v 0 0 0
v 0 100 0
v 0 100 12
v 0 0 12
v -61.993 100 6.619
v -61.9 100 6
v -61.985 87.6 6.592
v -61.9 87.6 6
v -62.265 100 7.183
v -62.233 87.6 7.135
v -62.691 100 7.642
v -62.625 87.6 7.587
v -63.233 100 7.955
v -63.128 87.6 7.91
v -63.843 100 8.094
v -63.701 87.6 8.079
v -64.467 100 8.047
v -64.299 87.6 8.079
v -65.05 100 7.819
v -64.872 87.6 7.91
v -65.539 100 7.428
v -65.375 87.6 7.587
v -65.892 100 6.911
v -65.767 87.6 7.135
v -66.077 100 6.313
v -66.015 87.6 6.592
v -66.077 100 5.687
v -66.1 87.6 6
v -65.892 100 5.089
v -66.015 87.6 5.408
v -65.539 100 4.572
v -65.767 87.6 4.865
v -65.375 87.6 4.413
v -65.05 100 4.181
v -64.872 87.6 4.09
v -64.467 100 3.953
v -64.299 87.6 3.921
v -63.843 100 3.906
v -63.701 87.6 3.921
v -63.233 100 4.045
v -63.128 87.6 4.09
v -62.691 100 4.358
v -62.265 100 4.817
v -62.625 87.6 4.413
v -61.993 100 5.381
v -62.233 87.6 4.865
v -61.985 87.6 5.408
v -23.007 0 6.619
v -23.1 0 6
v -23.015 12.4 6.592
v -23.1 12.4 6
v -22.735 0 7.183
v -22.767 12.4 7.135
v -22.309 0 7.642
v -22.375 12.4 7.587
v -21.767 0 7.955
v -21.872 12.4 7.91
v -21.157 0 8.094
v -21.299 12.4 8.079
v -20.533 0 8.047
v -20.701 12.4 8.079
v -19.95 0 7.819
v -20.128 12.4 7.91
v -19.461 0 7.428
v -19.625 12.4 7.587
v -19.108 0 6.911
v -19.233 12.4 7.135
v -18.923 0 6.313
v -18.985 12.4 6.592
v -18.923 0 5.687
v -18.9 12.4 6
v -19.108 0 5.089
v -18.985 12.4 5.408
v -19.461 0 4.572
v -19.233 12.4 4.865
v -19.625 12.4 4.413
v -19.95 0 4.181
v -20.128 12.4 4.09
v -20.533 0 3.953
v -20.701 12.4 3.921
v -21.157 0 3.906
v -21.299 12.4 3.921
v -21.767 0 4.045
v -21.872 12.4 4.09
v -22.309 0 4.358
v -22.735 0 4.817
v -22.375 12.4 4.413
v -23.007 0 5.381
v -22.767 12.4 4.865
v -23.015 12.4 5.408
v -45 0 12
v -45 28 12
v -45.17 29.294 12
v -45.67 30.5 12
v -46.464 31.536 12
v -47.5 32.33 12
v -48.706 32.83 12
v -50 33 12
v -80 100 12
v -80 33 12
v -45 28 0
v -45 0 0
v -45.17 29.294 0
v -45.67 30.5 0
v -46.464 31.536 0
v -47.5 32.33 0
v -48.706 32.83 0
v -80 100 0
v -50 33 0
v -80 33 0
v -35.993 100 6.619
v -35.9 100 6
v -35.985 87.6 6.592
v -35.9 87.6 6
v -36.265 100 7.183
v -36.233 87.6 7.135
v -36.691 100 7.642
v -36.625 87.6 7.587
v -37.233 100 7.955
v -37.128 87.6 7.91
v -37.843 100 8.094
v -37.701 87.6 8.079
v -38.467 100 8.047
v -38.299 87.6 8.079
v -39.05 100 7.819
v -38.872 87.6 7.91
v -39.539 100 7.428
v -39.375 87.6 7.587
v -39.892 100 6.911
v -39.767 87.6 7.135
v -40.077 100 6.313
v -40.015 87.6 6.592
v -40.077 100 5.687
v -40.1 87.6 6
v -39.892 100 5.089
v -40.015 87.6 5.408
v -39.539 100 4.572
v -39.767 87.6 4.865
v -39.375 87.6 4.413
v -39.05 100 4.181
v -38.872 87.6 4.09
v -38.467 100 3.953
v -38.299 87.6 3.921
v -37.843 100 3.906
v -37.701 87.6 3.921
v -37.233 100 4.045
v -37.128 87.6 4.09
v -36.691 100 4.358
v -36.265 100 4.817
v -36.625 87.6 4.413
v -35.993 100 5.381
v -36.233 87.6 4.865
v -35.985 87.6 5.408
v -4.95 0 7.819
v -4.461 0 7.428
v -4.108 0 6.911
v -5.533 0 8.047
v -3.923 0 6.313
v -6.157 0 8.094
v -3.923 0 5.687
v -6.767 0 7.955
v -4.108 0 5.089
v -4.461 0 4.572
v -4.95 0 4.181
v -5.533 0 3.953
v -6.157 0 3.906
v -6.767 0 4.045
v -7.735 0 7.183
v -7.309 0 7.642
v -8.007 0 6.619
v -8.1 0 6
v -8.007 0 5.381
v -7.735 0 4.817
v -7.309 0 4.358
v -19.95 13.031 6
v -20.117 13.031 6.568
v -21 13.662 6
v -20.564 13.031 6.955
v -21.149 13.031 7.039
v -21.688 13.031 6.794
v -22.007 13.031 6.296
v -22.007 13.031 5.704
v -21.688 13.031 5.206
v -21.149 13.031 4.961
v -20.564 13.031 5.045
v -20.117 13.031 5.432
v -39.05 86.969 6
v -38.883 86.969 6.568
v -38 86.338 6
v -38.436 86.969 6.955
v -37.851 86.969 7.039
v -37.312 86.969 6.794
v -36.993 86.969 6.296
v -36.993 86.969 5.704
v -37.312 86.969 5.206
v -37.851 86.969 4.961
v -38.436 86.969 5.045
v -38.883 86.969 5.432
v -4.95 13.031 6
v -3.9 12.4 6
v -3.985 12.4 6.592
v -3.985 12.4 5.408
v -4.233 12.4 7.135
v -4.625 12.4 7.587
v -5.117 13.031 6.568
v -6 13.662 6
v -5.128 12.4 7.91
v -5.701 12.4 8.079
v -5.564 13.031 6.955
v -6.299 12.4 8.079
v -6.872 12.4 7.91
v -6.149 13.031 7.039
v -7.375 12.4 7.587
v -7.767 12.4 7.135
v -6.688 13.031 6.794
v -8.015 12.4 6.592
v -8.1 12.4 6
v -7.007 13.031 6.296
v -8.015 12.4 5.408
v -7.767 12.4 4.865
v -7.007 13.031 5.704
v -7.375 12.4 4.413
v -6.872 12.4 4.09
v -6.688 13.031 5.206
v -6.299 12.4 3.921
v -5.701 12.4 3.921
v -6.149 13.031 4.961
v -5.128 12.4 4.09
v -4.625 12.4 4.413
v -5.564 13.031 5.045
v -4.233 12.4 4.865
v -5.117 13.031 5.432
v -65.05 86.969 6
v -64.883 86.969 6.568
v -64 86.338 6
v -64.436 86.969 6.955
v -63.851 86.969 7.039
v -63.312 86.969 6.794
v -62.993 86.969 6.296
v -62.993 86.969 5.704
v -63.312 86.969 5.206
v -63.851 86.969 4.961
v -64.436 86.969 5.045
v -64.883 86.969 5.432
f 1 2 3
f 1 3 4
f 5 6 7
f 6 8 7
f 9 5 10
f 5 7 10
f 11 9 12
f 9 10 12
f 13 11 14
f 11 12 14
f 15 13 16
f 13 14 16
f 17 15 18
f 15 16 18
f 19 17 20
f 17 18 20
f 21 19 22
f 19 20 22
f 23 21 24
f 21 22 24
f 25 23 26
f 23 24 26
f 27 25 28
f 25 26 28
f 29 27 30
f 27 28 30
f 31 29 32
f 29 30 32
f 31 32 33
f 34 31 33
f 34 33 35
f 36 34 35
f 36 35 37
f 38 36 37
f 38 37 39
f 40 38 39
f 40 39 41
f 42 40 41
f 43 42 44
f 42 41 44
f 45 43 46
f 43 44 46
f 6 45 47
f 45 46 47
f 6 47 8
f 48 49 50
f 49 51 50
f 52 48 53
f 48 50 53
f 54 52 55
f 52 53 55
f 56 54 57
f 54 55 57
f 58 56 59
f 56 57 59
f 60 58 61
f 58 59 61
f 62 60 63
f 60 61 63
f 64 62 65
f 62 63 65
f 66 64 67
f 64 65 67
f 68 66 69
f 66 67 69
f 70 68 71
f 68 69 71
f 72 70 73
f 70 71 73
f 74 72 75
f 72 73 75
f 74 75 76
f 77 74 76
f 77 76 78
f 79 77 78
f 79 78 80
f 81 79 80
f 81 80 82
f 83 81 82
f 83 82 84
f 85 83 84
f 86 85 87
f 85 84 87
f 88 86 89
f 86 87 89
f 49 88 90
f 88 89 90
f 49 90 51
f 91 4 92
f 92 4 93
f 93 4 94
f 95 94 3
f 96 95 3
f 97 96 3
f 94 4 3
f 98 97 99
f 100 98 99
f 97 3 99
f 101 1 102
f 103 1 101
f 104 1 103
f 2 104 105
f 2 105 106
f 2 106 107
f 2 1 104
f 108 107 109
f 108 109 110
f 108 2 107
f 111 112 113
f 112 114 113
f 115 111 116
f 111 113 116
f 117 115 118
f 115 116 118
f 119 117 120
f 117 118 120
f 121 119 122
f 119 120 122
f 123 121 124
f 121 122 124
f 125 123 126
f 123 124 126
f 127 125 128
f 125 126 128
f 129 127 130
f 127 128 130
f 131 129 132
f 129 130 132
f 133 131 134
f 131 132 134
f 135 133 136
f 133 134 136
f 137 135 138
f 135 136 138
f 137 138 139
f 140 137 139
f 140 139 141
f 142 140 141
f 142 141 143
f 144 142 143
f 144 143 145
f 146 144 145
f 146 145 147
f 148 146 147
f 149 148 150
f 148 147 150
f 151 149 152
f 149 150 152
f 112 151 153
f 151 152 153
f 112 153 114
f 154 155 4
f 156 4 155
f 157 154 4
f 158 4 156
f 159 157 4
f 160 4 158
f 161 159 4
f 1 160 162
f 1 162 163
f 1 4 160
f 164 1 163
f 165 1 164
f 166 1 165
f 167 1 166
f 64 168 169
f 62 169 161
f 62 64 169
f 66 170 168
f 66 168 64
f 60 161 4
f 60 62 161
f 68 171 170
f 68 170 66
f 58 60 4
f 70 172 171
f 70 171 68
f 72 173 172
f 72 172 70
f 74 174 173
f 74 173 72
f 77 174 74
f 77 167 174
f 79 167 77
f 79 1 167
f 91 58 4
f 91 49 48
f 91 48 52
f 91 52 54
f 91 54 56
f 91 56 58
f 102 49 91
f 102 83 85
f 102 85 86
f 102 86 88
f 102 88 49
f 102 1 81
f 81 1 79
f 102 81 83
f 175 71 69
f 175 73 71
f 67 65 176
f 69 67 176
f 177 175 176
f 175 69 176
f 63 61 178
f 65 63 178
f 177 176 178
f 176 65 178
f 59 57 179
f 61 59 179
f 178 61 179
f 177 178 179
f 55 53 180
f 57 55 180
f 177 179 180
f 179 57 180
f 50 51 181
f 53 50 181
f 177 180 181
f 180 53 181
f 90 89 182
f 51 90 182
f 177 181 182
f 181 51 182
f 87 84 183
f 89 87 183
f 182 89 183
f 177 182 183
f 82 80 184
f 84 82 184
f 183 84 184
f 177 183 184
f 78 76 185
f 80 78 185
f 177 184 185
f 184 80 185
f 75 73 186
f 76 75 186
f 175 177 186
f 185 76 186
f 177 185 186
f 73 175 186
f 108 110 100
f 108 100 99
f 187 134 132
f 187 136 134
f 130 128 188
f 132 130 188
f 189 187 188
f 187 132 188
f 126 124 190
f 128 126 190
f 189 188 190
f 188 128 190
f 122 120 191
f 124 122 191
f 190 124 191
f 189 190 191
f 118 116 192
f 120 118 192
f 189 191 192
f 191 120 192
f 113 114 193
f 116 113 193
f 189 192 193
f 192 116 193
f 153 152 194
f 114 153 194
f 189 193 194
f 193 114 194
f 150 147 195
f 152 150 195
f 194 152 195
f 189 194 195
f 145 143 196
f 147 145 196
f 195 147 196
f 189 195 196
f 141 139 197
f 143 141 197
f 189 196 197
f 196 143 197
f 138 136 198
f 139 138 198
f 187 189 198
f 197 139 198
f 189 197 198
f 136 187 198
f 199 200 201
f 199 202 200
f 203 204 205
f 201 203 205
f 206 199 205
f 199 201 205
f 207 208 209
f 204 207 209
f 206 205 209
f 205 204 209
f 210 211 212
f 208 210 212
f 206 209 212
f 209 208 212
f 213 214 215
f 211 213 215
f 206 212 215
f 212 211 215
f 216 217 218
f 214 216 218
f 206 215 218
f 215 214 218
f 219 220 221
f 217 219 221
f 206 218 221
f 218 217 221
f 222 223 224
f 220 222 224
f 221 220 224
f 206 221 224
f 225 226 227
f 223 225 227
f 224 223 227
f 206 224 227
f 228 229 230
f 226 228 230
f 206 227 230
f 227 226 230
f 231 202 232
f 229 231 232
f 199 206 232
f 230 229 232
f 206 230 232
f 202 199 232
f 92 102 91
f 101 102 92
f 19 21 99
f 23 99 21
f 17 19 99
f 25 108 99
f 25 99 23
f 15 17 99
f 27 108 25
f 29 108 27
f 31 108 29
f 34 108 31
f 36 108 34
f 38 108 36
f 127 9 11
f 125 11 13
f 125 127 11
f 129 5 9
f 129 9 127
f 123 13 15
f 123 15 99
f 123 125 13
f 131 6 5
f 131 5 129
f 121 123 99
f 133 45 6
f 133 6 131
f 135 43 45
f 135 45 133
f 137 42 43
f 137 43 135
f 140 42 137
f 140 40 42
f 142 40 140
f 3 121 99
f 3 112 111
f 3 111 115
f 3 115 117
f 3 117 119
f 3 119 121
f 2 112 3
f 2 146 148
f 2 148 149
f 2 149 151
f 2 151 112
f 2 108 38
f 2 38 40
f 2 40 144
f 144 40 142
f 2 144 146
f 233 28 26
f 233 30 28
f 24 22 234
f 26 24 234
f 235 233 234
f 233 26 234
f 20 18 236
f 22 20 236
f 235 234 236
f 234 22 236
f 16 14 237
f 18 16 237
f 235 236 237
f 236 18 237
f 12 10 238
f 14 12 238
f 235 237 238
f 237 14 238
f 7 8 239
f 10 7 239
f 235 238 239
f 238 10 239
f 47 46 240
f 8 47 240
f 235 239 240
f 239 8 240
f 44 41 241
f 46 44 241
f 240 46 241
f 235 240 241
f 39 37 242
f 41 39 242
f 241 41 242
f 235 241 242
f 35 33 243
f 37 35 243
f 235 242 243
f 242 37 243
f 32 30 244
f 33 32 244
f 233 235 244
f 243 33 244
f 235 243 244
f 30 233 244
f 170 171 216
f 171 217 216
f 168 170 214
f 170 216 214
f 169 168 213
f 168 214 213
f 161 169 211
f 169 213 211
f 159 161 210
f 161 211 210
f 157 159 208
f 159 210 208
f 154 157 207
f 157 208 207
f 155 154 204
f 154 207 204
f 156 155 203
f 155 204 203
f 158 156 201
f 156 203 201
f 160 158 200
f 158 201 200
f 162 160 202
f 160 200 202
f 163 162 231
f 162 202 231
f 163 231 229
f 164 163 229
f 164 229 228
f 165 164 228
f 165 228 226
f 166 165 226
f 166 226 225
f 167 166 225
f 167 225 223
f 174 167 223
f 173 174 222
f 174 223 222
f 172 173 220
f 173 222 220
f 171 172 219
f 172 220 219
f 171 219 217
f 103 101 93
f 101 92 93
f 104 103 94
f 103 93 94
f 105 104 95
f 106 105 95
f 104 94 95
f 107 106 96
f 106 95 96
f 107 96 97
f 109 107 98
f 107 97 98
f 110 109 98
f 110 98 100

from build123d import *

# Parameters (mm, degrees)
EXTRUDE_1_DEPTH        = 12
FILLET_1_R             = 5
HOLE_WIZARD_M5_1_D     = 4.2
HOLE_WIZARD_M5_1_DEPTH = 12.4
HOLE_WIZARD_M5_1_TIP   = 1.2618073
HOLE_WIZARD_M5_2_D     = 4.2
HOLE_WIZARD_M5_2_DEPTH = 12.4
HOLE_WIZARD_M5_2_TIP   = 1.2618073


with BuildPart() as part:
    # 草图1 → 凸台-拉伸1 (new body)
    with BuildSketch(Plane.XY):
        Polygon((0, 0), (-45, 0), (-45, 33), (-80, 33), (-80, 100), (0, 100), align=None)
    extrude(amount=EXTRUDE_1_DEPTH)

    # 圆角1
    fillet_1_edges = [part.edges().sort_by_distance(p)[0] for p in [
        (-45, 33, 6),
    ]]
    fillet(fillet_1_edges, radius=FILLET_1_R)

    # M5 螺纹孔1
    with Locations(Plane.XZ):
        with Locations((-6, 6), (-21, 6)):
            Hole(HOLE_WIZARD_M5_1_D / 2, depth=HOLE_WIZARD_M5_1_DEPTH)
            with Locations((0, 0, -(HOLE_WIZARD_M5_1_DEPTH + HOLE_WIZARD_M5_1_TIP / 2))):  # 118° drill point
                Cone(0, HOLE_WIZARD_M5_1_D / 2, HOLE_WIZARD_M5_1_TIP, mode=Mode.SUBTRACT)

    # M5 螺纹孔2
    with Locations(Plane(origin=(0, 100, 0), x_dir=(-1, 0, 0), z_dir=(0, 1, 0))):
        with Locations((38, 6), (64, 6)):
            Hole(HOLE_WIZARD_M5_2_D / 2, depth=HOLE_WIZARD_M5_2_DEPTH)
            with Locations((0, 0, -(HOLE_WIZARD_M5_2_DEPTH + HOLE_WIZARD_M5_2_TIP / 2))):  # 118° drill point
                Cone(0, HOLE_WIZARD_M5_2_D / 2, HOLE_WIZARD_M5_2_TIP, mode=Mode.SUBTRACT)


solid = part.part
